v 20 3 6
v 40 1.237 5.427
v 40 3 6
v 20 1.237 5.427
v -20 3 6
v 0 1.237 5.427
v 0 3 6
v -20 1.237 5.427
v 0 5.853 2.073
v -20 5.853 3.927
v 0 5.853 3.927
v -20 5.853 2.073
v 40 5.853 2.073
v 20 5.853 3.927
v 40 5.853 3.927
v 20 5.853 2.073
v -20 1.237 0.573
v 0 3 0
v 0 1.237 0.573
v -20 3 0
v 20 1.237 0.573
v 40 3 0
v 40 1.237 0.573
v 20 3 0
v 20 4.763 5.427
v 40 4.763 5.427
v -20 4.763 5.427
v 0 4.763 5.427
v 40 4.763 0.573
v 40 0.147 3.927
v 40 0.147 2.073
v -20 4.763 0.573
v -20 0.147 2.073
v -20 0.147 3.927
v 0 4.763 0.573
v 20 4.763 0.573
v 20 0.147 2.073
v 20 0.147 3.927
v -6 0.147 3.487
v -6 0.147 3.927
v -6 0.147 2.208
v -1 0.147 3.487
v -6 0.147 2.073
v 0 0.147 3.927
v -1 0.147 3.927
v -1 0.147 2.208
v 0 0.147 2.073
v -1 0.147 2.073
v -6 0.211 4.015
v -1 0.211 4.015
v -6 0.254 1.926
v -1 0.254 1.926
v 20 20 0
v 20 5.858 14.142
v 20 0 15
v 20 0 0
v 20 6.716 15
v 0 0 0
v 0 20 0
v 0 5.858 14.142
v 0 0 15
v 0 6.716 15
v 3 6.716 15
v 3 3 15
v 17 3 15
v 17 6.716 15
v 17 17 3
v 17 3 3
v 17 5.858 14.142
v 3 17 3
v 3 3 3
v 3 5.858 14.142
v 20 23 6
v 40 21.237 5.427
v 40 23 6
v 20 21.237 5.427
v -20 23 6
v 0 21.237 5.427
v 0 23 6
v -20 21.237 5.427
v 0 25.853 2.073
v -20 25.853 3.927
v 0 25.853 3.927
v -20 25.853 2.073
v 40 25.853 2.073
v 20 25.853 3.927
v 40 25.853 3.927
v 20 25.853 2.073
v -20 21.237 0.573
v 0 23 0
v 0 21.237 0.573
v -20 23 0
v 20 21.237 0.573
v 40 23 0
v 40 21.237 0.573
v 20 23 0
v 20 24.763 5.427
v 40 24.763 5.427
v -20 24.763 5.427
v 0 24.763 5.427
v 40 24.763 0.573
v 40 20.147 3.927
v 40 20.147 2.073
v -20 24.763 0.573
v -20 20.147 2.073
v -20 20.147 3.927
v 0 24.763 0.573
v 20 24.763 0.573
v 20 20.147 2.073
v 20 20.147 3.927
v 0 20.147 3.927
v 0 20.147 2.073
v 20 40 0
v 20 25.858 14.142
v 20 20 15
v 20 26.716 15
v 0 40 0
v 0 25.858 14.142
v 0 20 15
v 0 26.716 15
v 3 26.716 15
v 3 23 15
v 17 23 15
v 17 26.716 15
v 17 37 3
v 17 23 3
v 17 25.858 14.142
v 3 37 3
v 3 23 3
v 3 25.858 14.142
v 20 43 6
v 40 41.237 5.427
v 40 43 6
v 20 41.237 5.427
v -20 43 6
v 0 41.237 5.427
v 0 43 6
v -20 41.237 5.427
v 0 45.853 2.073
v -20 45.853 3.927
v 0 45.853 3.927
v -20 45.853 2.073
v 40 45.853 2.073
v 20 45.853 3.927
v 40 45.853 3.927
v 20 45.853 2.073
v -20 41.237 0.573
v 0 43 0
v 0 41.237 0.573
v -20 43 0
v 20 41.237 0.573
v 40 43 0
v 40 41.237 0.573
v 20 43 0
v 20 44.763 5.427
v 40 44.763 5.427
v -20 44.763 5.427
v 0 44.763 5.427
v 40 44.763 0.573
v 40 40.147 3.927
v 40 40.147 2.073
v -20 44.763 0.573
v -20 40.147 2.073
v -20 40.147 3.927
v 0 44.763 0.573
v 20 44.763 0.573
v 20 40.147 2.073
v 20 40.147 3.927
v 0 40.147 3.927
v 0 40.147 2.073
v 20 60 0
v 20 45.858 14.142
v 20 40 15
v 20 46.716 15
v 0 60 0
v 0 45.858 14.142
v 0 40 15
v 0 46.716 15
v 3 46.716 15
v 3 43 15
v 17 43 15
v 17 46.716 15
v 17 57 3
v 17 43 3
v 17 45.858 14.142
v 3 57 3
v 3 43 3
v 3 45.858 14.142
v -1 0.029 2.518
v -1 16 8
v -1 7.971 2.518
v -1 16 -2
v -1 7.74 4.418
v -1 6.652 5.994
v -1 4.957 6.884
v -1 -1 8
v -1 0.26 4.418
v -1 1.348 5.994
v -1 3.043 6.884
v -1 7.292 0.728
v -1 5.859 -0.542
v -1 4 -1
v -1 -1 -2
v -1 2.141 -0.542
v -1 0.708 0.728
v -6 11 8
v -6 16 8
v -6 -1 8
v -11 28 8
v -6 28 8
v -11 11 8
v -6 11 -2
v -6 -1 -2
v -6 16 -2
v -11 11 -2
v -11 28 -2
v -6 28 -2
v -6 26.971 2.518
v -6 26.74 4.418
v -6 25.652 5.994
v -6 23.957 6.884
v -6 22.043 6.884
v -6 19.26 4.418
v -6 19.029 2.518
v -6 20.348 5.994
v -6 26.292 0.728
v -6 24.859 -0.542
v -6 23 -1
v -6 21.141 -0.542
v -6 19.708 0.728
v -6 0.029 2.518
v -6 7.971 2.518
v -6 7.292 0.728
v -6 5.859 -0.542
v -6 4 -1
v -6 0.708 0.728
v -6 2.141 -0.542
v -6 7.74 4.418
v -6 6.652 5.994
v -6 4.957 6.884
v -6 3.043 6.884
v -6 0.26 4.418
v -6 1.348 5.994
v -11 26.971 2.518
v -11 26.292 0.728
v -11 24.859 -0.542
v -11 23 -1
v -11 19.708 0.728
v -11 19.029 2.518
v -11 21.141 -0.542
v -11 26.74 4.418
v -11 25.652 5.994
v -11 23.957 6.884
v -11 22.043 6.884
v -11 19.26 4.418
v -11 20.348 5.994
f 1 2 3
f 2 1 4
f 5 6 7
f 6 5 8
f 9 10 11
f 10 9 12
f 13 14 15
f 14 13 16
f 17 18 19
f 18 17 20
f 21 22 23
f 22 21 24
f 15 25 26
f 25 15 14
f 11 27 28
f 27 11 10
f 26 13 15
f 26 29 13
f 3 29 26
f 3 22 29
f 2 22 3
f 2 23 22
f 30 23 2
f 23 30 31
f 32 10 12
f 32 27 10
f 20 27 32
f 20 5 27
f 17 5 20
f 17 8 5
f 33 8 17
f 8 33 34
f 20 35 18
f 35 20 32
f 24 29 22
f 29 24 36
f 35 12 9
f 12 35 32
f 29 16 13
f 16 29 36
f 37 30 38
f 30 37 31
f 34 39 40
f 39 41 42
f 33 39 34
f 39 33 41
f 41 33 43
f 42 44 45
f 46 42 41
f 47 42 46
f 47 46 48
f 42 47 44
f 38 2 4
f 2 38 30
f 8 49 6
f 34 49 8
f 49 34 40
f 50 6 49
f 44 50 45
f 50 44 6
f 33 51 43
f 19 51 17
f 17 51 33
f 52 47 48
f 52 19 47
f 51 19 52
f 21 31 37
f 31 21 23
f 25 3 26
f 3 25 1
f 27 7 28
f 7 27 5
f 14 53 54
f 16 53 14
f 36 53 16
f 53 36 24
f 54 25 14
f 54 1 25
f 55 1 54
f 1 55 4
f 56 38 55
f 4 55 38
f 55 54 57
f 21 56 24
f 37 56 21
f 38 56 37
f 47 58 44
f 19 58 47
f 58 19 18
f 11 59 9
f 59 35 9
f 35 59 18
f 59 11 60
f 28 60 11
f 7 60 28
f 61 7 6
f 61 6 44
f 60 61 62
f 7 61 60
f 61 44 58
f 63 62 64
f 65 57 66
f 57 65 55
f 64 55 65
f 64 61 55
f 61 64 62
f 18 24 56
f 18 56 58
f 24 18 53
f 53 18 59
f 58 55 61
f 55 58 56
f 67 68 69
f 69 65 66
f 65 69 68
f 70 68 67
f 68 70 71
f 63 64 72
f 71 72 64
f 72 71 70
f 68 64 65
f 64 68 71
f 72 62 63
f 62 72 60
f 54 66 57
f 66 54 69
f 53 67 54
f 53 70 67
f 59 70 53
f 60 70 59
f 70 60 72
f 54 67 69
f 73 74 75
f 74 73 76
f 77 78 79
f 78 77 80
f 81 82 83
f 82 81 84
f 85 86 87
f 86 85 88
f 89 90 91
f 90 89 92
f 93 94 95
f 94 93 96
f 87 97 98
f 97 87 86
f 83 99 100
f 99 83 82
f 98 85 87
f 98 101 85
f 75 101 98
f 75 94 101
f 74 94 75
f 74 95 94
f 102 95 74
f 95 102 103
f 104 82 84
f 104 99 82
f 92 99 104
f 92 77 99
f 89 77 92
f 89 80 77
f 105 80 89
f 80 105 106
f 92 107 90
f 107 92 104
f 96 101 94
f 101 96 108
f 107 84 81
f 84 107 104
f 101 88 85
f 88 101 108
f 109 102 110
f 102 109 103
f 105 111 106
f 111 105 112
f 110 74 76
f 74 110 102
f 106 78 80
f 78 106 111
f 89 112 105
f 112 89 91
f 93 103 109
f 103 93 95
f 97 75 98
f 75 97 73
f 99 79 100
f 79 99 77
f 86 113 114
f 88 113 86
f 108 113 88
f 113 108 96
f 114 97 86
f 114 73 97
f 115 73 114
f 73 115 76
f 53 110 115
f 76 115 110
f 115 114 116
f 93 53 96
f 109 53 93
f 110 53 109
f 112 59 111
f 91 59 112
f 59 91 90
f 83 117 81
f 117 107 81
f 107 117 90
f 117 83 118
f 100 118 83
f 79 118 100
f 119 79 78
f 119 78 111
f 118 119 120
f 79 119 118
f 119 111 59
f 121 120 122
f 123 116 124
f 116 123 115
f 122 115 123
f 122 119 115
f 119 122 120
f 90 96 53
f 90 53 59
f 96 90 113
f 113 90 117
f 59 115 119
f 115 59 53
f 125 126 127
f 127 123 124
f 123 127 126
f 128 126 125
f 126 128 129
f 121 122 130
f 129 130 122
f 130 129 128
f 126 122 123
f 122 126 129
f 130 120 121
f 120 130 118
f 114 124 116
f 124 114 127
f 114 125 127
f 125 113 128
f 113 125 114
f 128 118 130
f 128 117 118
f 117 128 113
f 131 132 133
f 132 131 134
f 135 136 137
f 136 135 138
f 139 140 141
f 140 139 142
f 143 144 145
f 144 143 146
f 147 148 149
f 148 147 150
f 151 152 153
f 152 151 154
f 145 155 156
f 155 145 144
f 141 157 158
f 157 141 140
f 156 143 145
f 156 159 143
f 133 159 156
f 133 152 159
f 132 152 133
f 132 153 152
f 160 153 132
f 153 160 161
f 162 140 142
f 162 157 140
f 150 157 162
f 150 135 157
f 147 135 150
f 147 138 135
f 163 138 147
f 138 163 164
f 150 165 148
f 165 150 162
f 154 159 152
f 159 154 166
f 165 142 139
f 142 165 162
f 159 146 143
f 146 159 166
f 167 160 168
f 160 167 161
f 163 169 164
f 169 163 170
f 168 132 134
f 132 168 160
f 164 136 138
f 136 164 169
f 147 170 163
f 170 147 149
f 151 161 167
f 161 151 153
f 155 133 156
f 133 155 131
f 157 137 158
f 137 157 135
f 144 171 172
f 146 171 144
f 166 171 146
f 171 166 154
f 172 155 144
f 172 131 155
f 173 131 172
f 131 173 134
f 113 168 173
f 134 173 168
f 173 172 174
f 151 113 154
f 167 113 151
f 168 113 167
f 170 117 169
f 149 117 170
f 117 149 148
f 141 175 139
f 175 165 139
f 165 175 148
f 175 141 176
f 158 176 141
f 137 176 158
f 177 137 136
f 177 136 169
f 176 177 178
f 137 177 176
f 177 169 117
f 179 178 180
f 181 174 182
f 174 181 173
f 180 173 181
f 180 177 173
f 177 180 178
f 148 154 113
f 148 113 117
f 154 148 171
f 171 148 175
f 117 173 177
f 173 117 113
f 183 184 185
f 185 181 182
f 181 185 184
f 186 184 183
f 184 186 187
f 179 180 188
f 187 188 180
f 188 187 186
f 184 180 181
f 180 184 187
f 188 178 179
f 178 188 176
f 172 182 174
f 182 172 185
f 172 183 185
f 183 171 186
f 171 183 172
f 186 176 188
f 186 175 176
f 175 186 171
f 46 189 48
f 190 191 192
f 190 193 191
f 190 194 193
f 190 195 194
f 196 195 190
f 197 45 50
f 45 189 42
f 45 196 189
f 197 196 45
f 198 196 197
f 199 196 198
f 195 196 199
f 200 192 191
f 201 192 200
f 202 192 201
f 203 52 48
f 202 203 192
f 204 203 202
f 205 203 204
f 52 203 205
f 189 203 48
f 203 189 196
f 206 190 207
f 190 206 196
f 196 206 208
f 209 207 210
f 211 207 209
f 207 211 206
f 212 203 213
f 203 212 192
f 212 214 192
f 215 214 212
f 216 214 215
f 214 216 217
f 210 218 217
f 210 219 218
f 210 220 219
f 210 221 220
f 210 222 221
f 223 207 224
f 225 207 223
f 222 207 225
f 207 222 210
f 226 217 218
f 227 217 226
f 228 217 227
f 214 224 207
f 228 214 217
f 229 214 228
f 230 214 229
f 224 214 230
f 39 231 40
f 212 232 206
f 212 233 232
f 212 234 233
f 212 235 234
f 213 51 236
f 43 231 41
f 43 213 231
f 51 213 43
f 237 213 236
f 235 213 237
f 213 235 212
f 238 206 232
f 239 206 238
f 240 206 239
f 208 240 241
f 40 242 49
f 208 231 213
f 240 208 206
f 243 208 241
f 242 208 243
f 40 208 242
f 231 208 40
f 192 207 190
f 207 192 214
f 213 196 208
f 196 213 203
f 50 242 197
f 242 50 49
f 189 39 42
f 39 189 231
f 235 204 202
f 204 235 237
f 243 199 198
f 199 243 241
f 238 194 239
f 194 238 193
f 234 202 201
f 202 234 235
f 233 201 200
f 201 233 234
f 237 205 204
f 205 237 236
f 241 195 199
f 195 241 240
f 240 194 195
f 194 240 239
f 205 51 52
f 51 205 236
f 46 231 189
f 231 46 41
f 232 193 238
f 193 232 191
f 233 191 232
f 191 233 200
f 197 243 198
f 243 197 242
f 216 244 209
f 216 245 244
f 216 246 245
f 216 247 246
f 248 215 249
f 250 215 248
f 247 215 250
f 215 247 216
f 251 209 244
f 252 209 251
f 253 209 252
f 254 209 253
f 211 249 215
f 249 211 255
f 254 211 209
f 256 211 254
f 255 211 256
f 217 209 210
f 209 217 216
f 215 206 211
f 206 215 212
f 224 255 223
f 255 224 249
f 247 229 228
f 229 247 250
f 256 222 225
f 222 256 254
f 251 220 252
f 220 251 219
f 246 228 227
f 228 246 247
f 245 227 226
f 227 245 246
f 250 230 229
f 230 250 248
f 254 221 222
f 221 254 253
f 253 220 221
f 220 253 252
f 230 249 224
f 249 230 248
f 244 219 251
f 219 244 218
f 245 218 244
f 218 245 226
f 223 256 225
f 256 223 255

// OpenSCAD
module cart() {
	union() {
		difference() {
			translate([-20, 3, 3]) rotate(90, [0, 1, 0]) cylinder(r=3,h=60);
			cube([20, 20, 20]);
		}
		difference() {
			cube([20, 20, 15]);
			translate([3, 3, 3]) cube([14, 14, 18]);
			translate([-2, 20, 0]) rotate(45, [1, 0, 0])  cube([30, 20, 20]);
		}
	}
}
cart();
translate([0, 20, 0]) cart();
translate([0, 40, 0]) cart();

module clip() {
	union() {
		difference() {
			cube([5, 17, 10]);
			translate([-1, 5, 5]) rotate(90, [0, 1, 0]) cylinder(r=4, h=10);
		}
		translate([-5, 12, 0]) difference() {
			cube([5, 17, 10]);
			translate([-1, 12, 5]) rotate(90, [0, 1, 0]) cylinder(r=4, h=10);
		}
	}
}

translate([-6, -1 ,-2]) clip();
